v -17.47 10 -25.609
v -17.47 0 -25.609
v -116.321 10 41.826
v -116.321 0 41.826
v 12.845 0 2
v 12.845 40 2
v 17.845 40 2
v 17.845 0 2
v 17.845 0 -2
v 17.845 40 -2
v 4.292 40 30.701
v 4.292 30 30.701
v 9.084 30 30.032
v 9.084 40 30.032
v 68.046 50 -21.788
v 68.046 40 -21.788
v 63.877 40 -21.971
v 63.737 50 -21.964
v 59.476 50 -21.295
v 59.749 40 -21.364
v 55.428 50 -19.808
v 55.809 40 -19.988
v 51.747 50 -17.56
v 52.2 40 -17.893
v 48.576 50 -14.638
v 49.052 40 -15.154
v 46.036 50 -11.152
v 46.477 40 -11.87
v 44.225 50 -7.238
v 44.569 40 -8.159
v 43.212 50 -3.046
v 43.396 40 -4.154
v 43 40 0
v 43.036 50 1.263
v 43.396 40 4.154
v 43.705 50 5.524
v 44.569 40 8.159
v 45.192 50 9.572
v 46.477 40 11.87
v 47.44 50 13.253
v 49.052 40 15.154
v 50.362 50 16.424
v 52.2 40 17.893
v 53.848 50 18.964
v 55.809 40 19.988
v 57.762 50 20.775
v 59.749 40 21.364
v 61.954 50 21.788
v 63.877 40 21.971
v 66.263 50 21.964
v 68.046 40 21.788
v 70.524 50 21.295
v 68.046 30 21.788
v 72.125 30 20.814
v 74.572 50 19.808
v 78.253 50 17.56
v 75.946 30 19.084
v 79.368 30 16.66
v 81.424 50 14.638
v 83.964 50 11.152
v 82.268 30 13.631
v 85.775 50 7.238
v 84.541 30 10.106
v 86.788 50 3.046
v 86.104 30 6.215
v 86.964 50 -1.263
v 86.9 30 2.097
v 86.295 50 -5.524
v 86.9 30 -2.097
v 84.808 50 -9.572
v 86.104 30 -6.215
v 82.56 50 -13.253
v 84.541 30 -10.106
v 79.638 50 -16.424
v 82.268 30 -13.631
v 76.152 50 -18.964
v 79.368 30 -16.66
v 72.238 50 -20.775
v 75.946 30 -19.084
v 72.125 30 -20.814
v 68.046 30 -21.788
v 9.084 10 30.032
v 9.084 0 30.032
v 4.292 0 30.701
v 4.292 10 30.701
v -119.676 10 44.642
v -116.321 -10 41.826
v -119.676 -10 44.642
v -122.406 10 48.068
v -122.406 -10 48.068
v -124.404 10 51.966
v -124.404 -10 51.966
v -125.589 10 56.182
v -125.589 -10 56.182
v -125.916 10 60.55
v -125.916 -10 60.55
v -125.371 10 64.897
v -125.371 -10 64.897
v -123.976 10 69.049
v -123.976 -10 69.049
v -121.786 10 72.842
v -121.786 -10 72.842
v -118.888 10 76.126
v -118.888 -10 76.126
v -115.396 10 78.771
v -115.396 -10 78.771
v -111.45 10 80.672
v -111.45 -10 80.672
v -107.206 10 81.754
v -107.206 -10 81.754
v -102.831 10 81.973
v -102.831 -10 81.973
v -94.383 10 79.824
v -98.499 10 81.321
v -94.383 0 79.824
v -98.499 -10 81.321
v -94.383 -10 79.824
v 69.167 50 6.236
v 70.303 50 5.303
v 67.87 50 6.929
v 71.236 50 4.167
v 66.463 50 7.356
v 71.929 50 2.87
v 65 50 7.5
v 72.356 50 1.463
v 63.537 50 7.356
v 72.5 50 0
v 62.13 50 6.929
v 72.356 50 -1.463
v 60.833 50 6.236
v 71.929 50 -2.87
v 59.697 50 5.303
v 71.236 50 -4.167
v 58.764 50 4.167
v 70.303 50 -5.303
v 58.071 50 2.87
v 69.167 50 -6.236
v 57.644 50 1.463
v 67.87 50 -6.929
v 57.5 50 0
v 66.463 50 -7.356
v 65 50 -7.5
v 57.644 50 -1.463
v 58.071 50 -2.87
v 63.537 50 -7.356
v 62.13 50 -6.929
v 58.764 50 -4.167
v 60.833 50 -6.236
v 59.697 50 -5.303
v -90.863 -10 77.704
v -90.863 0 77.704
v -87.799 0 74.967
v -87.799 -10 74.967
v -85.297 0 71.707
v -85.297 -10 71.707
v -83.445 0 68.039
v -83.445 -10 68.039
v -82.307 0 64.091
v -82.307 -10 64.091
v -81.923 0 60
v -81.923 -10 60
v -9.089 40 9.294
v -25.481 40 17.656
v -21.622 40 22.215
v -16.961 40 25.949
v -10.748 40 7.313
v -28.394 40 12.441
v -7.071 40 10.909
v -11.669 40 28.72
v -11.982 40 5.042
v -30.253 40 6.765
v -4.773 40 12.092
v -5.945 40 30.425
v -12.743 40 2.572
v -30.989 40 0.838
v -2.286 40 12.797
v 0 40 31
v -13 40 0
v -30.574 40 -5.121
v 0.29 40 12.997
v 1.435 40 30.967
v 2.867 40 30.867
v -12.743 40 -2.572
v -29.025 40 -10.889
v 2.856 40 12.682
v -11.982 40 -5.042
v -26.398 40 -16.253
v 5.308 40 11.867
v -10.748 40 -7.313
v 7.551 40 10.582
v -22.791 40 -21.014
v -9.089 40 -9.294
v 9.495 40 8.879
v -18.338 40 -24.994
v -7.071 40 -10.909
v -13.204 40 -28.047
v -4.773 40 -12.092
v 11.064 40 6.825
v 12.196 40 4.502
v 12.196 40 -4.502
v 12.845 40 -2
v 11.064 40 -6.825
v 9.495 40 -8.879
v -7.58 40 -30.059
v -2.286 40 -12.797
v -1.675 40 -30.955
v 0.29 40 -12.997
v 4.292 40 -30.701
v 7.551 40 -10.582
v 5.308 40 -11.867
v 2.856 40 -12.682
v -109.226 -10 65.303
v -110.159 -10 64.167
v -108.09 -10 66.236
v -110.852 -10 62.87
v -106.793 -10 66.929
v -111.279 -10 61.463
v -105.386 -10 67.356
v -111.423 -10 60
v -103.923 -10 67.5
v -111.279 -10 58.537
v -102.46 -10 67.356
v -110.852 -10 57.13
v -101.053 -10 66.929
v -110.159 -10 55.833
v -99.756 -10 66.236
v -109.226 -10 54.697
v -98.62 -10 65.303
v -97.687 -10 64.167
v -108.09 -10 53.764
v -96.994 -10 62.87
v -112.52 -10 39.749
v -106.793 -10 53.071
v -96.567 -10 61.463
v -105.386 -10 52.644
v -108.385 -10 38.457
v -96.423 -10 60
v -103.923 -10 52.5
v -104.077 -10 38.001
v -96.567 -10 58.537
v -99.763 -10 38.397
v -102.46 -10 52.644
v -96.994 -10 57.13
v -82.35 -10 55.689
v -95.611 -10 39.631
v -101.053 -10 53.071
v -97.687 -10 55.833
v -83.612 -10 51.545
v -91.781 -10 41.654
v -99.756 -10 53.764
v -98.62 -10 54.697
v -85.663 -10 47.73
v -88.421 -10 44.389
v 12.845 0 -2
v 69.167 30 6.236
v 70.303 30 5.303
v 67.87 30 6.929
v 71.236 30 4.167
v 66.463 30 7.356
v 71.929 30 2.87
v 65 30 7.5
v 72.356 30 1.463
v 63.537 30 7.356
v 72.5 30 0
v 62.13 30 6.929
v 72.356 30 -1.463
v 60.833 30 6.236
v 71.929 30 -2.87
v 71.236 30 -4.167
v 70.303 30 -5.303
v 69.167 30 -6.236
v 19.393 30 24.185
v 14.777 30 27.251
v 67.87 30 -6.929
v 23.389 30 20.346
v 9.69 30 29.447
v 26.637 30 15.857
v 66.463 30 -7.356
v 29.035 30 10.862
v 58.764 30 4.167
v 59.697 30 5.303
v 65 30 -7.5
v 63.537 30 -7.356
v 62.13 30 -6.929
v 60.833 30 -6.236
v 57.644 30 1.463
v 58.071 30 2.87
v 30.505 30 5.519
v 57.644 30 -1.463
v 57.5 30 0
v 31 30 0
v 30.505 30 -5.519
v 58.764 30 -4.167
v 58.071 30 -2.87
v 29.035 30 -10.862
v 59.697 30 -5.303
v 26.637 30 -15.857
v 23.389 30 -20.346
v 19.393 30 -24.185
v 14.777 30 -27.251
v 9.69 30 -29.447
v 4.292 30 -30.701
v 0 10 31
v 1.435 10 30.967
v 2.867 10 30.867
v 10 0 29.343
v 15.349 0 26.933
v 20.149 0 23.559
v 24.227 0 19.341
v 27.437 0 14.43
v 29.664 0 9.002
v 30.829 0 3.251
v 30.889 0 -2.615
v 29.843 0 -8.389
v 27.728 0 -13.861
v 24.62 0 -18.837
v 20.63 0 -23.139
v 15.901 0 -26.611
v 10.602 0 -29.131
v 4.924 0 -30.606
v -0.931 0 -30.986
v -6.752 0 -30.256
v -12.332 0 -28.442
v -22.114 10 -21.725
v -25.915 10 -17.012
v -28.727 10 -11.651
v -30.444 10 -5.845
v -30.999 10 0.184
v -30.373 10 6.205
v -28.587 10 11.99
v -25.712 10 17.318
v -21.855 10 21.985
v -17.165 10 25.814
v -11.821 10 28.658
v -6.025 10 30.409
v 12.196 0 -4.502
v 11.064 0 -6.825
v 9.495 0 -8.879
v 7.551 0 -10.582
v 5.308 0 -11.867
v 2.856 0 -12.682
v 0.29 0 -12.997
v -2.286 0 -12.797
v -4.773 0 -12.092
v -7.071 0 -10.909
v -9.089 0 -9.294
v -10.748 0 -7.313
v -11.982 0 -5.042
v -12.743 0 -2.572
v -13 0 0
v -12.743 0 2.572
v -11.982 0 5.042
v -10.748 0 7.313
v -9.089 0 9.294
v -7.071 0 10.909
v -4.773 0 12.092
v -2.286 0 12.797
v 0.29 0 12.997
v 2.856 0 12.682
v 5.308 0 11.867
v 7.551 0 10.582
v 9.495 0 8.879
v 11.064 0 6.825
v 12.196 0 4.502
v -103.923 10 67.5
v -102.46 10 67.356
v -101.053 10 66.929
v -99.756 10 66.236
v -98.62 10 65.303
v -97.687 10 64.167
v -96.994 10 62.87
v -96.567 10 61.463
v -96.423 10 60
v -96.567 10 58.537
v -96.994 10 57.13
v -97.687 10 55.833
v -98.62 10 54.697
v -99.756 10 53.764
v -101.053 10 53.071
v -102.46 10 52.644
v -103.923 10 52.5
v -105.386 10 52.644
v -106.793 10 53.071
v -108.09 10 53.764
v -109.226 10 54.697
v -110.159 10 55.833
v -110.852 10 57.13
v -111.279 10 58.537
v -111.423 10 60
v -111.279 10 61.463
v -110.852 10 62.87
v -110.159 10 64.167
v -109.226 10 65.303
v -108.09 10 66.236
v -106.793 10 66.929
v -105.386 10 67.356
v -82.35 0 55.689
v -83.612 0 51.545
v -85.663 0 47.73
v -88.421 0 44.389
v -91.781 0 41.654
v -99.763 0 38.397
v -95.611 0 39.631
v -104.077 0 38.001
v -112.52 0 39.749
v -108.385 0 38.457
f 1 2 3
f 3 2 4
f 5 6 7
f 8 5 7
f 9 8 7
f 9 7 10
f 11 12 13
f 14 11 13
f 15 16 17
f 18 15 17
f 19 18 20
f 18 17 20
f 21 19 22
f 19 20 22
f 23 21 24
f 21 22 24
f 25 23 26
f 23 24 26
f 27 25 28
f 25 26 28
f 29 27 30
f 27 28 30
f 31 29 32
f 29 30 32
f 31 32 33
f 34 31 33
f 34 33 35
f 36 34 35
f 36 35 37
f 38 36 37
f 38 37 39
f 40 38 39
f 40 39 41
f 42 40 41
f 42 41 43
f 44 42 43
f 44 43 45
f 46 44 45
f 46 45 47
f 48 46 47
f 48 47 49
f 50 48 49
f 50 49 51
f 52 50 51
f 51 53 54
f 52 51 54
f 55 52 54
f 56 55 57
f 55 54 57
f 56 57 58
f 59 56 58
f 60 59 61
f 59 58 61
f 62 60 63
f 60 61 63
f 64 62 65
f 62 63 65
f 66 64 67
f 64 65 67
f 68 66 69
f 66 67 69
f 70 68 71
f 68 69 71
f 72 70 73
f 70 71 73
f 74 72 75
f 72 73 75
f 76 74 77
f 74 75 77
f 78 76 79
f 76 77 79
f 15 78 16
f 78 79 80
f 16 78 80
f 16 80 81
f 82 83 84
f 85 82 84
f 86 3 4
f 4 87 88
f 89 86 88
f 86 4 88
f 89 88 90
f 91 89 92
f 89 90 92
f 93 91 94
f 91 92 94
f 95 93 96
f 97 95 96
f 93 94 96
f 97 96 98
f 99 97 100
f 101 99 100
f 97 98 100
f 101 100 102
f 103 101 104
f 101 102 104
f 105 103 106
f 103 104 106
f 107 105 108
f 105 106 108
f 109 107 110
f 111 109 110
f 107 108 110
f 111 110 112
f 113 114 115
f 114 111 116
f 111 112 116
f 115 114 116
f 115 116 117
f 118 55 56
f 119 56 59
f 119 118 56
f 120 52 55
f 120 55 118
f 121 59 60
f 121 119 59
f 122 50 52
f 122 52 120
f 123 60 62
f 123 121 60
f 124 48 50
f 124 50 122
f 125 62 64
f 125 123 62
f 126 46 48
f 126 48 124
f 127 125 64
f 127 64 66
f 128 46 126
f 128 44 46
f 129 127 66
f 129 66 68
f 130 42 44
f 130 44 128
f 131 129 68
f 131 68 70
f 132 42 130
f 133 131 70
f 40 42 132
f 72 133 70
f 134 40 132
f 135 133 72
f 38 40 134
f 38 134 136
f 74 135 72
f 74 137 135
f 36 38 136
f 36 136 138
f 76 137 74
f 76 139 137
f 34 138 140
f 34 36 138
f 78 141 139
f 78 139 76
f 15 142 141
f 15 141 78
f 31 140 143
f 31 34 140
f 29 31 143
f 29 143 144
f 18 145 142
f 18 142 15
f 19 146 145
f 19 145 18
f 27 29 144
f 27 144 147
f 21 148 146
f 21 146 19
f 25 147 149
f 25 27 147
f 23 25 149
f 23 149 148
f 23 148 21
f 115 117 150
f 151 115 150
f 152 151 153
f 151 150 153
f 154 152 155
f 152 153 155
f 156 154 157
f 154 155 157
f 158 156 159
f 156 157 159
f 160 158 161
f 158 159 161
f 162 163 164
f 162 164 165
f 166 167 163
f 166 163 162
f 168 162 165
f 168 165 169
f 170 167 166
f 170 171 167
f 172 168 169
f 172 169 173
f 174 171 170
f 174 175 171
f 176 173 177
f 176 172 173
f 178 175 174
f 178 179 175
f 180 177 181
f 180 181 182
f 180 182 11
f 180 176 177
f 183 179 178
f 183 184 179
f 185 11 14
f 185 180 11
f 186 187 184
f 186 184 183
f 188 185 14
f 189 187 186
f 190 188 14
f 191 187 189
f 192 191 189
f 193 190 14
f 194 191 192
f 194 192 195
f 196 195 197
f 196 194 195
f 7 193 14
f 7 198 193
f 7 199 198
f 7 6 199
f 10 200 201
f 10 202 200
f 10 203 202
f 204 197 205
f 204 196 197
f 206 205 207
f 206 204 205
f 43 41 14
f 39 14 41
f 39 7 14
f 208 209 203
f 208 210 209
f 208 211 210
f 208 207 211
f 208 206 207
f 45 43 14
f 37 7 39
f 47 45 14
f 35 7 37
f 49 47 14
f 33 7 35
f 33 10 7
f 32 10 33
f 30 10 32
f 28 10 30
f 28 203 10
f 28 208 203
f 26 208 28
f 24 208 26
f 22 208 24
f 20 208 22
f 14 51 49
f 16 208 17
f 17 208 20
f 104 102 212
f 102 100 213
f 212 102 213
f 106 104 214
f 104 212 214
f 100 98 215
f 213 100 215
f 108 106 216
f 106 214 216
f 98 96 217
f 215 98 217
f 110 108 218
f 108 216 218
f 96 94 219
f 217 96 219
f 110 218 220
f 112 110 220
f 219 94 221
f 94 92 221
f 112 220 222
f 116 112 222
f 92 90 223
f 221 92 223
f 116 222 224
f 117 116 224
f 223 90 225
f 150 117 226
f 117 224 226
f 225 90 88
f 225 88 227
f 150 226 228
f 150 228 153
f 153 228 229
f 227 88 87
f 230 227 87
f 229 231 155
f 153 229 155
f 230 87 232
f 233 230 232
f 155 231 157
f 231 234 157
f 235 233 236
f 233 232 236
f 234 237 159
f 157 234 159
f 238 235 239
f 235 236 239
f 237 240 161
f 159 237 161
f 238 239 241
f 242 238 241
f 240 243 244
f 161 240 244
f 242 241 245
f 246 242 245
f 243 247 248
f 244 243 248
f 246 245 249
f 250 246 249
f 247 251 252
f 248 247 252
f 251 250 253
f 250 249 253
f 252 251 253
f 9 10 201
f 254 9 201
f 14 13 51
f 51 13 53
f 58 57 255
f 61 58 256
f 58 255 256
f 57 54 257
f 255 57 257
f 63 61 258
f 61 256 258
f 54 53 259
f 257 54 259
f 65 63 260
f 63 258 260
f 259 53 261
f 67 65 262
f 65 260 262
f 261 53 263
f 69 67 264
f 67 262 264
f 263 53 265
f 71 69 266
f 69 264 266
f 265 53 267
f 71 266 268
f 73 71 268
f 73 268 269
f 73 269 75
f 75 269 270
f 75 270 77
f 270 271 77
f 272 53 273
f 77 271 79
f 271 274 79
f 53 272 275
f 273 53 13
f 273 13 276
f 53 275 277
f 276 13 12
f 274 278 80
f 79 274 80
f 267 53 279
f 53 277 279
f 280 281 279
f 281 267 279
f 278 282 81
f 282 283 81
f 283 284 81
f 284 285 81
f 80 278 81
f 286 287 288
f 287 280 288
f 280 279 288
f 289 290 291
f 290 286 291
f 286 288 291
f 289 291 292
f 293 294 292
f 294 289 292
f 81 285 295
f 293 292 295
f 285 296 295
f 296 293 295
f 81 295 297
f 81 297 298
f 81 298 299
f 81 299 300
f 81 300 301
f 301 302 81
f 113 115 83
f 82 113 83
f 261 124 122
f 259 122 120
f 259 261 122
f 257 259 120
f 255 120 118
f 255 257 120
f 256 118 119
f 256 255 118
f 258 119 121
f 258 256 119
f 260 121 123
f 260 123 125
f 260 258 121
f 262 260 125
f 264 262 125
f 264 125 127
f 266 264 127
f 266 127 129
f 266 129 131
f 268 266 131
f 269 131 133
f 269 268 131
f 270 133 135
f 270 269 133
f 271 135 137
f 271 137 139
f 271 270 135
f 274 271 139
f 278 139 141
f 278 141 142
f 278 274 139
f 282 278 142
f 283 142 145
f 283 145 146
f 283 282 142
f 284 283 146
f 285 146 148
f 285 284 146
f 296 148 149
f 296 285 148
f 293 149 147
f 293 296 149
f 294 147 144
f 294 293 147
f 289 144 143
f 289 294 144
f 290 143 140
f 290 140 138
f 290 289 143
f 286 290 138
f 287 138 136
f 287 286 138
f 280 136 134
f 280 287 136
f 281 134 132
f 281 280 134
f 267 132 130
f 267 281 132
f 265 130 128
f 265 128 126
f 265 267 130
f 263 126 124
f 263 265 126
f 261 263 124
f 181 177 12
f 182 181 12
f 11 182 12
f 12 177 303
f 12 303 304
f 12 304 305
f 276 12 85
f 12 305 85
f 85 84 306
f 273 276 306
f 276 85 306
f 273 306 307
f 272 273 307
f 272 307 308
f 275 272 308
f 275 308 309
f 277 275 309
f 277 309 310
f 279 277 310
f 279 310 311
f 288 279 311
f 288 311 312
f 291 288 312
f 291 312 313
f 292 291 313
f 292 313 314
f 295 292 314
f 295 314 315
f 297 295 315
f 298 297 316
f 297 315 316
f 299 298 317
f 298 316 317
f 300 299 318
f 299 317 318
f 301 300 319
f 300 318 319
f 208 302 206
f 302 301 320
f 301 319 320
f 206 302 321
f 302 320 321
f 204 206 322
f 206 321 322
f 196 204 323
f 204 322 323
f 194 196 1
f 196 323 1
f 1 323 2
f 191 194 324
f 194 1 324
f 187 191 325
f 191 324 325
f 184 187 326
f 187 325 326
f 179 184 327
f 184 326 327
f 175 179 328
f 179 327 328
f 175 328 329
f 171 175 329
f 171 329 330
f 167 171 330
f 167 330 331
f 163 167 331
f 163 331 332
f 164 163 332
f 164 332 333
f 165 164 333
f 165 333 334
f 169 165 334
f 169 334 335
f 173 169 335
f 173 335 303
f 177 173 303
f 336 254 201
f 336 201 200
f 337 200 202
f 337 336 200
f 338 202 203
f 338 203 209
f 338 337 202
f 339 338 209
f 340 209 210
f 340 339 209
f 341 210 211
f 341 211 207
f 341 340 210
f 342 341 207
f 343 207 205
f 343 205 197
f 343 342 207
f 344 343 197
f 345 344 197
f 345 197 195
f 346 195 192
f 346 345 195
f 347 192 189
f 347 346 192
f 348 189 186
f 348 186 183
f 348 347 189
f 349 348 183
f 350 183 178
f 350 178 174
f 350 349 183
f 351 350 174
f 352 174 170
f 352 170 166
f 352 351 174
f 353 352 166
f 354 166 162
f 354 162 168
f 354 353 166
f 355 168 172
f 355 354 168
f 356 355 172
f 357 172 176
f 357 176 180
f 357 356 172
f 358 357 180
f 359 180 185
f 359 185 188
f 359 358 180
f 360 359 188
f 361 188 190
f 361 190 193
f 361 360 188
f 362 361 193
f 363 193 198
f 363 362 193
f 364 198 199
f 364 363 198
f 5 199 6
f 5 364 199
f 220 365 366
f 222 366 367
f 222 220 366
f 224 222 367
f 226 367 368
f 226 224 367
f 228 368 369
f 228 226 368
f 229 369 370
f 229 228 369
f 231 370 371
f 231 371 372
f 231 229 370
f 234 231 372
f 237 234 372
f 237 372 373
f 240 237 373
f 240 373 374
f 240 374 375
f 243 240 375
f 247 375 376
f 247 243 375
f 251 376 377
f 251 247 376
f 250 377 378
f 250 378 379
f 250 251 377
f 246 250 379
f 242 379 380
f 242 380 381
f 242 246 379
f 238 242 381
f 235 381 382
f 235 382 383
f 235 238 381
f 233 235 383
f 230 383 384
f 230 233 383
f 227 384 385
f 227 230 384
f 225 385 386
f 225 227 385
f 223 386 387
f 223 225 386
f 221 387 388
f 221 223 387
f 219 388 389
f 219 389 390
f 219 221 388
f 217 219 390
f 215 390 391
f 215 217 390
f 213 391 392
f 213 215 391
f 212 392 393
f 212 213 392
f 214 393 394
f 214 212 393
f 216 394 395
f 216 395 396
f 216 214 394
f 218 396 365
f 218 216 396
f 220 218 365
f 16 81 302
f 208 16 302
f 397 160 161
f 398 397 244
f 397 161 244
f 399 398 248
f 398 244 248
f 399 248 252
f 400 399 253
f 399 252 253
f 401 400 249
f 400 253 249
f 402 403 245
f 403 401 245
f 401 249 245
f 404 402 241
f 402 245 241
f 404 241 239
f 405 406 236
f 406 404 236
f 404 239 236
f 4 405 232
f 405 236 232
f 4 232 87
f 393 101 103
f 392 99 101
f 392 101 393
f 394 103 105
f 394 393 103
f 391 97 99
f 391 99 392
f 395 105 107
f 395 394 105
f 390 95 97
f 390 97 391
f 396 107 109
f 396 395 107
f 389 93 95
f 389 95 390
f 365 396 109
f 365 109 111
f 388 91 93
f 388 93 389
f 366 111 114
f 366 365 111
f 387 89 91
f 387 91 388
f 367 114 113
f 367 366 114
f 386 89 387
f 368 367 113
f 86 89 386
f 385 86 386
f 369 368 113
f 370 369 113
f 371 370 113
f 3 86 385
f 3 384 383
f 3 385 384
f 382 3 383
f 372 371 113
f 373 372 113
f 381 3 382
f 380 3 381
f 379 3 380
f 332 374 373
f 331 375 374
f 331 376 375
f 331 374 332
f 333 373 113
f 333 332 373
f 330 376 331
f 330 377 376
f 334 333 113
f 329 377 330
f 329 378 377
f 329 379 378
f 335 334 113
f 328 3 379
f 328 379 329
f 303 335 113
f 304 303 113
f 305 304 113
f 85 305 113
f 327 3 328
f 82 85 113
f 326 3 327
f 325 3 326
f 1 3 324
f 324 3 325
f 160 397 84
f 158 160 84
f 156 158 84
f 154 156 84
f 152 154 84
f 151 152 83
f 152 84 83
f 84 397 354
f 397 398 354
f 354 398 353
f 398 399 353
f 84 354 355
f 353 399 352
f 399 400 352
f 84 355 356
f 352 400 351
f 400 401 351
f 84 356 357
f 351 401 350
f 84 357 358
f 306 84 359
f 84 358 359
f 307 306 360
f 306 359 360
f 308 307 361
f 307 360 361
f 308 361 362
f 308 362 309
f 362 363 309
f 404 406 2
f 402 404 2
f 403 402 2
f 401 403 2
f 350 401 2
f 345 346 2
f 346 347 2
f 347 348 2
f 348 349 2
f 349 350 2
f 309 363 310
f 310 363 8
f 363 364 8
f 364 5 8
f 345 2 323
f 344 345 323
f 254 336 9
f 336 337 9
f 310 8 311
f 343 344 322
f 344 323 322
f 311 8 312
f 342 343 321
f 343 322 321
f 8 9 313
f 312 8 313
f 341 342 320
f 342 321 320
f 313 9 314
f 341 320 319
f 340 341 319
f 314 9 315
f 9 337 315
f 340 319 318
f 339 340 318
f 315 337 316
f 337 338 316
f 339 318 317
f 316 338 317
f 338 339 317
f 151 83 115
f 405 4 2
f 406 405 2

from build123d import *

# Parameters (mm, degrees)
SKETCH1_R           = 31
BOSS_EXTRUDE1_DEPTH = 40
BOSS_EXTRUDE2_START = 30
BOSS_EXTRUDE2_DEPTH = 10
BOSS_EXTRUDE3_START = 30
SKETCH1_4_R         = 7.5
BOSS_EXTRUDE3_DEPTH = 20
BOSS_EXTRUDE4_DEPTH = 10
BOSS_EXTRUDE5_START = -10
SKETCH1_6_R         = 7.5
BOSS_EXTRUDE5_DEPTH = 20


with BuildPart() as part:
    # Sketch1 → Boss-Extrude1 (new body)
    with BuildSketch(Plane(origin=(0, 0, 0), x_dir=(1, 0, 0), z_dir=(0, 1, 0))):
        Circle(SKETCH1_R)
        with BuildLine():
            Line((12.845232579, 2), (17.845232579, 2))
            Line((17.845232579, 2), (17.845232579, -2))
            Line((17.845232579, -2), (12.845232579, -2))
            ThreePointArc((12.845232579, -2), (-13, 0), (12.845232579, 2))
        make_face(mode=Mode.SUBTRACT)
    extrude(amount=BOSS_EXTRUDE1_DEPTH)

    # Sketch1<3> → Boss-Extrude2 (add)
    with BuildSketch(Plane(origin=(0, 0, 0), x_dir=(1, 0, 0), z_dir=(0, 1, 0)).offset(BOSS_EXTRUDE2_START)):
        with BuildLine():
            Line((4.292307692, -30.701402161), (9.08353603, -30.031549164))
            Line((9.08353603, -30.031549164), (68.046153846, -21.788091856))
            ThreePointArc((68.046153846, -21.788091856), (43, 0), (68.046153846, 21.788091856))
            Line((68.046153846, 21.788091856), (4.292307692, 30.701402161))
            ThreePointArc((4.292307692, 30.701402161), (23.388688916, 20.346233823), (31, 0))
            ThreePointArc((31, 0), (23.388688916, -20.346233823), (4.292307692, -30.701402161))
        make_face()
    extrude(amount=BOSS_EXTRUDE2_DEPTH)

    # Sketch1<4> → Boss-Extrude3 (add)
    with BuildSketch(Plane(origin=(0, 0, 0), x_dir=(1, 0, 0), z_dir=(0, 1, 0)).offset(BOSS_EXTRUDE3_START)):
        with BuildLine():
            ThreePointArc((68.046153846, 21.788091856), (43, 0), (68.046153846, -21.788091856))
            ThreePointArc((68.046153846, -21.788091856), (81.598424392, -14.439262713), (87, 0))
            ThreePointArc((87, 0), (81.598424392, 14.439262713), (68.046153846, 21.788091856))
        make_face()
        with Locations((65, 0)):
            Circle(SKETCH1_4_R, mode=Mode.SUBTRACT)
    extrude(amount=BOSS_EXTRUDE3_DEPTH)

    # Sketch1<5> → Boss-Extrude4 (add)
    with BuildSketch(Plane(origin=(0, 0, 0), x_dir=(1, 0, 0), z_dir=(0, 1, 0))):
        with BuildLine():
            Line((-94.382971499, -79.823897994), (9.08353603, -30.031549164))
            Line((9.08353603, -30.031549164), (4.292307692, -30.701402161))
            ThreePointArc((4.292307692, -30.701402161), (-28.915707021, -11.175056488), (-17.469853837, 25.608674447))
            Line((-17.469853837, 25.608674447), (-116.321009242, -41.826102006))
            ThreePointArc((-116.321009242, -41.826102006), (-93.645771026, -40.54807031), (-81.923048454, -60))
            ThreePointArc((-81.923048454, -60), (-85.296700275, -71.70722655), (-94.382971499, -79.823897994))
        make_face()
    extrude(amount=BOSS_EXTRUDE4_DEPTH)

    # Sketch1<6> → Boss-Extrude5 (add)
    with BuildSketch(Plane(origin=(0, 0, 0), x_dir=(1, 0, 0), z_dir=(0, 1, 0)).offset(BOSS_EXTRUDE5_START)):
        with BuildLine():
            ThreePointArc((-116.321009242, -41.826102006), (-122.975607337, -71), (-94.382971499, -79.823897994))
            ThreePointArc((-94.382971499, -79.823897994), (-85.296700275, -71.70722655), (-81.923048454, -60))
            ThreePointArc((-81.923048454, -60), (-93.645771026, -40.54807031), (-116.321009242, -41.826102006))
        make_face()
        with Locations((-103.923048454, -60)):
            Circle(SKETCH1_6_R, mode=Mode.SUBTRACT)
    extrude(amount=BOSS_EXTRUDE5_DEPTH)


solid = part.part
